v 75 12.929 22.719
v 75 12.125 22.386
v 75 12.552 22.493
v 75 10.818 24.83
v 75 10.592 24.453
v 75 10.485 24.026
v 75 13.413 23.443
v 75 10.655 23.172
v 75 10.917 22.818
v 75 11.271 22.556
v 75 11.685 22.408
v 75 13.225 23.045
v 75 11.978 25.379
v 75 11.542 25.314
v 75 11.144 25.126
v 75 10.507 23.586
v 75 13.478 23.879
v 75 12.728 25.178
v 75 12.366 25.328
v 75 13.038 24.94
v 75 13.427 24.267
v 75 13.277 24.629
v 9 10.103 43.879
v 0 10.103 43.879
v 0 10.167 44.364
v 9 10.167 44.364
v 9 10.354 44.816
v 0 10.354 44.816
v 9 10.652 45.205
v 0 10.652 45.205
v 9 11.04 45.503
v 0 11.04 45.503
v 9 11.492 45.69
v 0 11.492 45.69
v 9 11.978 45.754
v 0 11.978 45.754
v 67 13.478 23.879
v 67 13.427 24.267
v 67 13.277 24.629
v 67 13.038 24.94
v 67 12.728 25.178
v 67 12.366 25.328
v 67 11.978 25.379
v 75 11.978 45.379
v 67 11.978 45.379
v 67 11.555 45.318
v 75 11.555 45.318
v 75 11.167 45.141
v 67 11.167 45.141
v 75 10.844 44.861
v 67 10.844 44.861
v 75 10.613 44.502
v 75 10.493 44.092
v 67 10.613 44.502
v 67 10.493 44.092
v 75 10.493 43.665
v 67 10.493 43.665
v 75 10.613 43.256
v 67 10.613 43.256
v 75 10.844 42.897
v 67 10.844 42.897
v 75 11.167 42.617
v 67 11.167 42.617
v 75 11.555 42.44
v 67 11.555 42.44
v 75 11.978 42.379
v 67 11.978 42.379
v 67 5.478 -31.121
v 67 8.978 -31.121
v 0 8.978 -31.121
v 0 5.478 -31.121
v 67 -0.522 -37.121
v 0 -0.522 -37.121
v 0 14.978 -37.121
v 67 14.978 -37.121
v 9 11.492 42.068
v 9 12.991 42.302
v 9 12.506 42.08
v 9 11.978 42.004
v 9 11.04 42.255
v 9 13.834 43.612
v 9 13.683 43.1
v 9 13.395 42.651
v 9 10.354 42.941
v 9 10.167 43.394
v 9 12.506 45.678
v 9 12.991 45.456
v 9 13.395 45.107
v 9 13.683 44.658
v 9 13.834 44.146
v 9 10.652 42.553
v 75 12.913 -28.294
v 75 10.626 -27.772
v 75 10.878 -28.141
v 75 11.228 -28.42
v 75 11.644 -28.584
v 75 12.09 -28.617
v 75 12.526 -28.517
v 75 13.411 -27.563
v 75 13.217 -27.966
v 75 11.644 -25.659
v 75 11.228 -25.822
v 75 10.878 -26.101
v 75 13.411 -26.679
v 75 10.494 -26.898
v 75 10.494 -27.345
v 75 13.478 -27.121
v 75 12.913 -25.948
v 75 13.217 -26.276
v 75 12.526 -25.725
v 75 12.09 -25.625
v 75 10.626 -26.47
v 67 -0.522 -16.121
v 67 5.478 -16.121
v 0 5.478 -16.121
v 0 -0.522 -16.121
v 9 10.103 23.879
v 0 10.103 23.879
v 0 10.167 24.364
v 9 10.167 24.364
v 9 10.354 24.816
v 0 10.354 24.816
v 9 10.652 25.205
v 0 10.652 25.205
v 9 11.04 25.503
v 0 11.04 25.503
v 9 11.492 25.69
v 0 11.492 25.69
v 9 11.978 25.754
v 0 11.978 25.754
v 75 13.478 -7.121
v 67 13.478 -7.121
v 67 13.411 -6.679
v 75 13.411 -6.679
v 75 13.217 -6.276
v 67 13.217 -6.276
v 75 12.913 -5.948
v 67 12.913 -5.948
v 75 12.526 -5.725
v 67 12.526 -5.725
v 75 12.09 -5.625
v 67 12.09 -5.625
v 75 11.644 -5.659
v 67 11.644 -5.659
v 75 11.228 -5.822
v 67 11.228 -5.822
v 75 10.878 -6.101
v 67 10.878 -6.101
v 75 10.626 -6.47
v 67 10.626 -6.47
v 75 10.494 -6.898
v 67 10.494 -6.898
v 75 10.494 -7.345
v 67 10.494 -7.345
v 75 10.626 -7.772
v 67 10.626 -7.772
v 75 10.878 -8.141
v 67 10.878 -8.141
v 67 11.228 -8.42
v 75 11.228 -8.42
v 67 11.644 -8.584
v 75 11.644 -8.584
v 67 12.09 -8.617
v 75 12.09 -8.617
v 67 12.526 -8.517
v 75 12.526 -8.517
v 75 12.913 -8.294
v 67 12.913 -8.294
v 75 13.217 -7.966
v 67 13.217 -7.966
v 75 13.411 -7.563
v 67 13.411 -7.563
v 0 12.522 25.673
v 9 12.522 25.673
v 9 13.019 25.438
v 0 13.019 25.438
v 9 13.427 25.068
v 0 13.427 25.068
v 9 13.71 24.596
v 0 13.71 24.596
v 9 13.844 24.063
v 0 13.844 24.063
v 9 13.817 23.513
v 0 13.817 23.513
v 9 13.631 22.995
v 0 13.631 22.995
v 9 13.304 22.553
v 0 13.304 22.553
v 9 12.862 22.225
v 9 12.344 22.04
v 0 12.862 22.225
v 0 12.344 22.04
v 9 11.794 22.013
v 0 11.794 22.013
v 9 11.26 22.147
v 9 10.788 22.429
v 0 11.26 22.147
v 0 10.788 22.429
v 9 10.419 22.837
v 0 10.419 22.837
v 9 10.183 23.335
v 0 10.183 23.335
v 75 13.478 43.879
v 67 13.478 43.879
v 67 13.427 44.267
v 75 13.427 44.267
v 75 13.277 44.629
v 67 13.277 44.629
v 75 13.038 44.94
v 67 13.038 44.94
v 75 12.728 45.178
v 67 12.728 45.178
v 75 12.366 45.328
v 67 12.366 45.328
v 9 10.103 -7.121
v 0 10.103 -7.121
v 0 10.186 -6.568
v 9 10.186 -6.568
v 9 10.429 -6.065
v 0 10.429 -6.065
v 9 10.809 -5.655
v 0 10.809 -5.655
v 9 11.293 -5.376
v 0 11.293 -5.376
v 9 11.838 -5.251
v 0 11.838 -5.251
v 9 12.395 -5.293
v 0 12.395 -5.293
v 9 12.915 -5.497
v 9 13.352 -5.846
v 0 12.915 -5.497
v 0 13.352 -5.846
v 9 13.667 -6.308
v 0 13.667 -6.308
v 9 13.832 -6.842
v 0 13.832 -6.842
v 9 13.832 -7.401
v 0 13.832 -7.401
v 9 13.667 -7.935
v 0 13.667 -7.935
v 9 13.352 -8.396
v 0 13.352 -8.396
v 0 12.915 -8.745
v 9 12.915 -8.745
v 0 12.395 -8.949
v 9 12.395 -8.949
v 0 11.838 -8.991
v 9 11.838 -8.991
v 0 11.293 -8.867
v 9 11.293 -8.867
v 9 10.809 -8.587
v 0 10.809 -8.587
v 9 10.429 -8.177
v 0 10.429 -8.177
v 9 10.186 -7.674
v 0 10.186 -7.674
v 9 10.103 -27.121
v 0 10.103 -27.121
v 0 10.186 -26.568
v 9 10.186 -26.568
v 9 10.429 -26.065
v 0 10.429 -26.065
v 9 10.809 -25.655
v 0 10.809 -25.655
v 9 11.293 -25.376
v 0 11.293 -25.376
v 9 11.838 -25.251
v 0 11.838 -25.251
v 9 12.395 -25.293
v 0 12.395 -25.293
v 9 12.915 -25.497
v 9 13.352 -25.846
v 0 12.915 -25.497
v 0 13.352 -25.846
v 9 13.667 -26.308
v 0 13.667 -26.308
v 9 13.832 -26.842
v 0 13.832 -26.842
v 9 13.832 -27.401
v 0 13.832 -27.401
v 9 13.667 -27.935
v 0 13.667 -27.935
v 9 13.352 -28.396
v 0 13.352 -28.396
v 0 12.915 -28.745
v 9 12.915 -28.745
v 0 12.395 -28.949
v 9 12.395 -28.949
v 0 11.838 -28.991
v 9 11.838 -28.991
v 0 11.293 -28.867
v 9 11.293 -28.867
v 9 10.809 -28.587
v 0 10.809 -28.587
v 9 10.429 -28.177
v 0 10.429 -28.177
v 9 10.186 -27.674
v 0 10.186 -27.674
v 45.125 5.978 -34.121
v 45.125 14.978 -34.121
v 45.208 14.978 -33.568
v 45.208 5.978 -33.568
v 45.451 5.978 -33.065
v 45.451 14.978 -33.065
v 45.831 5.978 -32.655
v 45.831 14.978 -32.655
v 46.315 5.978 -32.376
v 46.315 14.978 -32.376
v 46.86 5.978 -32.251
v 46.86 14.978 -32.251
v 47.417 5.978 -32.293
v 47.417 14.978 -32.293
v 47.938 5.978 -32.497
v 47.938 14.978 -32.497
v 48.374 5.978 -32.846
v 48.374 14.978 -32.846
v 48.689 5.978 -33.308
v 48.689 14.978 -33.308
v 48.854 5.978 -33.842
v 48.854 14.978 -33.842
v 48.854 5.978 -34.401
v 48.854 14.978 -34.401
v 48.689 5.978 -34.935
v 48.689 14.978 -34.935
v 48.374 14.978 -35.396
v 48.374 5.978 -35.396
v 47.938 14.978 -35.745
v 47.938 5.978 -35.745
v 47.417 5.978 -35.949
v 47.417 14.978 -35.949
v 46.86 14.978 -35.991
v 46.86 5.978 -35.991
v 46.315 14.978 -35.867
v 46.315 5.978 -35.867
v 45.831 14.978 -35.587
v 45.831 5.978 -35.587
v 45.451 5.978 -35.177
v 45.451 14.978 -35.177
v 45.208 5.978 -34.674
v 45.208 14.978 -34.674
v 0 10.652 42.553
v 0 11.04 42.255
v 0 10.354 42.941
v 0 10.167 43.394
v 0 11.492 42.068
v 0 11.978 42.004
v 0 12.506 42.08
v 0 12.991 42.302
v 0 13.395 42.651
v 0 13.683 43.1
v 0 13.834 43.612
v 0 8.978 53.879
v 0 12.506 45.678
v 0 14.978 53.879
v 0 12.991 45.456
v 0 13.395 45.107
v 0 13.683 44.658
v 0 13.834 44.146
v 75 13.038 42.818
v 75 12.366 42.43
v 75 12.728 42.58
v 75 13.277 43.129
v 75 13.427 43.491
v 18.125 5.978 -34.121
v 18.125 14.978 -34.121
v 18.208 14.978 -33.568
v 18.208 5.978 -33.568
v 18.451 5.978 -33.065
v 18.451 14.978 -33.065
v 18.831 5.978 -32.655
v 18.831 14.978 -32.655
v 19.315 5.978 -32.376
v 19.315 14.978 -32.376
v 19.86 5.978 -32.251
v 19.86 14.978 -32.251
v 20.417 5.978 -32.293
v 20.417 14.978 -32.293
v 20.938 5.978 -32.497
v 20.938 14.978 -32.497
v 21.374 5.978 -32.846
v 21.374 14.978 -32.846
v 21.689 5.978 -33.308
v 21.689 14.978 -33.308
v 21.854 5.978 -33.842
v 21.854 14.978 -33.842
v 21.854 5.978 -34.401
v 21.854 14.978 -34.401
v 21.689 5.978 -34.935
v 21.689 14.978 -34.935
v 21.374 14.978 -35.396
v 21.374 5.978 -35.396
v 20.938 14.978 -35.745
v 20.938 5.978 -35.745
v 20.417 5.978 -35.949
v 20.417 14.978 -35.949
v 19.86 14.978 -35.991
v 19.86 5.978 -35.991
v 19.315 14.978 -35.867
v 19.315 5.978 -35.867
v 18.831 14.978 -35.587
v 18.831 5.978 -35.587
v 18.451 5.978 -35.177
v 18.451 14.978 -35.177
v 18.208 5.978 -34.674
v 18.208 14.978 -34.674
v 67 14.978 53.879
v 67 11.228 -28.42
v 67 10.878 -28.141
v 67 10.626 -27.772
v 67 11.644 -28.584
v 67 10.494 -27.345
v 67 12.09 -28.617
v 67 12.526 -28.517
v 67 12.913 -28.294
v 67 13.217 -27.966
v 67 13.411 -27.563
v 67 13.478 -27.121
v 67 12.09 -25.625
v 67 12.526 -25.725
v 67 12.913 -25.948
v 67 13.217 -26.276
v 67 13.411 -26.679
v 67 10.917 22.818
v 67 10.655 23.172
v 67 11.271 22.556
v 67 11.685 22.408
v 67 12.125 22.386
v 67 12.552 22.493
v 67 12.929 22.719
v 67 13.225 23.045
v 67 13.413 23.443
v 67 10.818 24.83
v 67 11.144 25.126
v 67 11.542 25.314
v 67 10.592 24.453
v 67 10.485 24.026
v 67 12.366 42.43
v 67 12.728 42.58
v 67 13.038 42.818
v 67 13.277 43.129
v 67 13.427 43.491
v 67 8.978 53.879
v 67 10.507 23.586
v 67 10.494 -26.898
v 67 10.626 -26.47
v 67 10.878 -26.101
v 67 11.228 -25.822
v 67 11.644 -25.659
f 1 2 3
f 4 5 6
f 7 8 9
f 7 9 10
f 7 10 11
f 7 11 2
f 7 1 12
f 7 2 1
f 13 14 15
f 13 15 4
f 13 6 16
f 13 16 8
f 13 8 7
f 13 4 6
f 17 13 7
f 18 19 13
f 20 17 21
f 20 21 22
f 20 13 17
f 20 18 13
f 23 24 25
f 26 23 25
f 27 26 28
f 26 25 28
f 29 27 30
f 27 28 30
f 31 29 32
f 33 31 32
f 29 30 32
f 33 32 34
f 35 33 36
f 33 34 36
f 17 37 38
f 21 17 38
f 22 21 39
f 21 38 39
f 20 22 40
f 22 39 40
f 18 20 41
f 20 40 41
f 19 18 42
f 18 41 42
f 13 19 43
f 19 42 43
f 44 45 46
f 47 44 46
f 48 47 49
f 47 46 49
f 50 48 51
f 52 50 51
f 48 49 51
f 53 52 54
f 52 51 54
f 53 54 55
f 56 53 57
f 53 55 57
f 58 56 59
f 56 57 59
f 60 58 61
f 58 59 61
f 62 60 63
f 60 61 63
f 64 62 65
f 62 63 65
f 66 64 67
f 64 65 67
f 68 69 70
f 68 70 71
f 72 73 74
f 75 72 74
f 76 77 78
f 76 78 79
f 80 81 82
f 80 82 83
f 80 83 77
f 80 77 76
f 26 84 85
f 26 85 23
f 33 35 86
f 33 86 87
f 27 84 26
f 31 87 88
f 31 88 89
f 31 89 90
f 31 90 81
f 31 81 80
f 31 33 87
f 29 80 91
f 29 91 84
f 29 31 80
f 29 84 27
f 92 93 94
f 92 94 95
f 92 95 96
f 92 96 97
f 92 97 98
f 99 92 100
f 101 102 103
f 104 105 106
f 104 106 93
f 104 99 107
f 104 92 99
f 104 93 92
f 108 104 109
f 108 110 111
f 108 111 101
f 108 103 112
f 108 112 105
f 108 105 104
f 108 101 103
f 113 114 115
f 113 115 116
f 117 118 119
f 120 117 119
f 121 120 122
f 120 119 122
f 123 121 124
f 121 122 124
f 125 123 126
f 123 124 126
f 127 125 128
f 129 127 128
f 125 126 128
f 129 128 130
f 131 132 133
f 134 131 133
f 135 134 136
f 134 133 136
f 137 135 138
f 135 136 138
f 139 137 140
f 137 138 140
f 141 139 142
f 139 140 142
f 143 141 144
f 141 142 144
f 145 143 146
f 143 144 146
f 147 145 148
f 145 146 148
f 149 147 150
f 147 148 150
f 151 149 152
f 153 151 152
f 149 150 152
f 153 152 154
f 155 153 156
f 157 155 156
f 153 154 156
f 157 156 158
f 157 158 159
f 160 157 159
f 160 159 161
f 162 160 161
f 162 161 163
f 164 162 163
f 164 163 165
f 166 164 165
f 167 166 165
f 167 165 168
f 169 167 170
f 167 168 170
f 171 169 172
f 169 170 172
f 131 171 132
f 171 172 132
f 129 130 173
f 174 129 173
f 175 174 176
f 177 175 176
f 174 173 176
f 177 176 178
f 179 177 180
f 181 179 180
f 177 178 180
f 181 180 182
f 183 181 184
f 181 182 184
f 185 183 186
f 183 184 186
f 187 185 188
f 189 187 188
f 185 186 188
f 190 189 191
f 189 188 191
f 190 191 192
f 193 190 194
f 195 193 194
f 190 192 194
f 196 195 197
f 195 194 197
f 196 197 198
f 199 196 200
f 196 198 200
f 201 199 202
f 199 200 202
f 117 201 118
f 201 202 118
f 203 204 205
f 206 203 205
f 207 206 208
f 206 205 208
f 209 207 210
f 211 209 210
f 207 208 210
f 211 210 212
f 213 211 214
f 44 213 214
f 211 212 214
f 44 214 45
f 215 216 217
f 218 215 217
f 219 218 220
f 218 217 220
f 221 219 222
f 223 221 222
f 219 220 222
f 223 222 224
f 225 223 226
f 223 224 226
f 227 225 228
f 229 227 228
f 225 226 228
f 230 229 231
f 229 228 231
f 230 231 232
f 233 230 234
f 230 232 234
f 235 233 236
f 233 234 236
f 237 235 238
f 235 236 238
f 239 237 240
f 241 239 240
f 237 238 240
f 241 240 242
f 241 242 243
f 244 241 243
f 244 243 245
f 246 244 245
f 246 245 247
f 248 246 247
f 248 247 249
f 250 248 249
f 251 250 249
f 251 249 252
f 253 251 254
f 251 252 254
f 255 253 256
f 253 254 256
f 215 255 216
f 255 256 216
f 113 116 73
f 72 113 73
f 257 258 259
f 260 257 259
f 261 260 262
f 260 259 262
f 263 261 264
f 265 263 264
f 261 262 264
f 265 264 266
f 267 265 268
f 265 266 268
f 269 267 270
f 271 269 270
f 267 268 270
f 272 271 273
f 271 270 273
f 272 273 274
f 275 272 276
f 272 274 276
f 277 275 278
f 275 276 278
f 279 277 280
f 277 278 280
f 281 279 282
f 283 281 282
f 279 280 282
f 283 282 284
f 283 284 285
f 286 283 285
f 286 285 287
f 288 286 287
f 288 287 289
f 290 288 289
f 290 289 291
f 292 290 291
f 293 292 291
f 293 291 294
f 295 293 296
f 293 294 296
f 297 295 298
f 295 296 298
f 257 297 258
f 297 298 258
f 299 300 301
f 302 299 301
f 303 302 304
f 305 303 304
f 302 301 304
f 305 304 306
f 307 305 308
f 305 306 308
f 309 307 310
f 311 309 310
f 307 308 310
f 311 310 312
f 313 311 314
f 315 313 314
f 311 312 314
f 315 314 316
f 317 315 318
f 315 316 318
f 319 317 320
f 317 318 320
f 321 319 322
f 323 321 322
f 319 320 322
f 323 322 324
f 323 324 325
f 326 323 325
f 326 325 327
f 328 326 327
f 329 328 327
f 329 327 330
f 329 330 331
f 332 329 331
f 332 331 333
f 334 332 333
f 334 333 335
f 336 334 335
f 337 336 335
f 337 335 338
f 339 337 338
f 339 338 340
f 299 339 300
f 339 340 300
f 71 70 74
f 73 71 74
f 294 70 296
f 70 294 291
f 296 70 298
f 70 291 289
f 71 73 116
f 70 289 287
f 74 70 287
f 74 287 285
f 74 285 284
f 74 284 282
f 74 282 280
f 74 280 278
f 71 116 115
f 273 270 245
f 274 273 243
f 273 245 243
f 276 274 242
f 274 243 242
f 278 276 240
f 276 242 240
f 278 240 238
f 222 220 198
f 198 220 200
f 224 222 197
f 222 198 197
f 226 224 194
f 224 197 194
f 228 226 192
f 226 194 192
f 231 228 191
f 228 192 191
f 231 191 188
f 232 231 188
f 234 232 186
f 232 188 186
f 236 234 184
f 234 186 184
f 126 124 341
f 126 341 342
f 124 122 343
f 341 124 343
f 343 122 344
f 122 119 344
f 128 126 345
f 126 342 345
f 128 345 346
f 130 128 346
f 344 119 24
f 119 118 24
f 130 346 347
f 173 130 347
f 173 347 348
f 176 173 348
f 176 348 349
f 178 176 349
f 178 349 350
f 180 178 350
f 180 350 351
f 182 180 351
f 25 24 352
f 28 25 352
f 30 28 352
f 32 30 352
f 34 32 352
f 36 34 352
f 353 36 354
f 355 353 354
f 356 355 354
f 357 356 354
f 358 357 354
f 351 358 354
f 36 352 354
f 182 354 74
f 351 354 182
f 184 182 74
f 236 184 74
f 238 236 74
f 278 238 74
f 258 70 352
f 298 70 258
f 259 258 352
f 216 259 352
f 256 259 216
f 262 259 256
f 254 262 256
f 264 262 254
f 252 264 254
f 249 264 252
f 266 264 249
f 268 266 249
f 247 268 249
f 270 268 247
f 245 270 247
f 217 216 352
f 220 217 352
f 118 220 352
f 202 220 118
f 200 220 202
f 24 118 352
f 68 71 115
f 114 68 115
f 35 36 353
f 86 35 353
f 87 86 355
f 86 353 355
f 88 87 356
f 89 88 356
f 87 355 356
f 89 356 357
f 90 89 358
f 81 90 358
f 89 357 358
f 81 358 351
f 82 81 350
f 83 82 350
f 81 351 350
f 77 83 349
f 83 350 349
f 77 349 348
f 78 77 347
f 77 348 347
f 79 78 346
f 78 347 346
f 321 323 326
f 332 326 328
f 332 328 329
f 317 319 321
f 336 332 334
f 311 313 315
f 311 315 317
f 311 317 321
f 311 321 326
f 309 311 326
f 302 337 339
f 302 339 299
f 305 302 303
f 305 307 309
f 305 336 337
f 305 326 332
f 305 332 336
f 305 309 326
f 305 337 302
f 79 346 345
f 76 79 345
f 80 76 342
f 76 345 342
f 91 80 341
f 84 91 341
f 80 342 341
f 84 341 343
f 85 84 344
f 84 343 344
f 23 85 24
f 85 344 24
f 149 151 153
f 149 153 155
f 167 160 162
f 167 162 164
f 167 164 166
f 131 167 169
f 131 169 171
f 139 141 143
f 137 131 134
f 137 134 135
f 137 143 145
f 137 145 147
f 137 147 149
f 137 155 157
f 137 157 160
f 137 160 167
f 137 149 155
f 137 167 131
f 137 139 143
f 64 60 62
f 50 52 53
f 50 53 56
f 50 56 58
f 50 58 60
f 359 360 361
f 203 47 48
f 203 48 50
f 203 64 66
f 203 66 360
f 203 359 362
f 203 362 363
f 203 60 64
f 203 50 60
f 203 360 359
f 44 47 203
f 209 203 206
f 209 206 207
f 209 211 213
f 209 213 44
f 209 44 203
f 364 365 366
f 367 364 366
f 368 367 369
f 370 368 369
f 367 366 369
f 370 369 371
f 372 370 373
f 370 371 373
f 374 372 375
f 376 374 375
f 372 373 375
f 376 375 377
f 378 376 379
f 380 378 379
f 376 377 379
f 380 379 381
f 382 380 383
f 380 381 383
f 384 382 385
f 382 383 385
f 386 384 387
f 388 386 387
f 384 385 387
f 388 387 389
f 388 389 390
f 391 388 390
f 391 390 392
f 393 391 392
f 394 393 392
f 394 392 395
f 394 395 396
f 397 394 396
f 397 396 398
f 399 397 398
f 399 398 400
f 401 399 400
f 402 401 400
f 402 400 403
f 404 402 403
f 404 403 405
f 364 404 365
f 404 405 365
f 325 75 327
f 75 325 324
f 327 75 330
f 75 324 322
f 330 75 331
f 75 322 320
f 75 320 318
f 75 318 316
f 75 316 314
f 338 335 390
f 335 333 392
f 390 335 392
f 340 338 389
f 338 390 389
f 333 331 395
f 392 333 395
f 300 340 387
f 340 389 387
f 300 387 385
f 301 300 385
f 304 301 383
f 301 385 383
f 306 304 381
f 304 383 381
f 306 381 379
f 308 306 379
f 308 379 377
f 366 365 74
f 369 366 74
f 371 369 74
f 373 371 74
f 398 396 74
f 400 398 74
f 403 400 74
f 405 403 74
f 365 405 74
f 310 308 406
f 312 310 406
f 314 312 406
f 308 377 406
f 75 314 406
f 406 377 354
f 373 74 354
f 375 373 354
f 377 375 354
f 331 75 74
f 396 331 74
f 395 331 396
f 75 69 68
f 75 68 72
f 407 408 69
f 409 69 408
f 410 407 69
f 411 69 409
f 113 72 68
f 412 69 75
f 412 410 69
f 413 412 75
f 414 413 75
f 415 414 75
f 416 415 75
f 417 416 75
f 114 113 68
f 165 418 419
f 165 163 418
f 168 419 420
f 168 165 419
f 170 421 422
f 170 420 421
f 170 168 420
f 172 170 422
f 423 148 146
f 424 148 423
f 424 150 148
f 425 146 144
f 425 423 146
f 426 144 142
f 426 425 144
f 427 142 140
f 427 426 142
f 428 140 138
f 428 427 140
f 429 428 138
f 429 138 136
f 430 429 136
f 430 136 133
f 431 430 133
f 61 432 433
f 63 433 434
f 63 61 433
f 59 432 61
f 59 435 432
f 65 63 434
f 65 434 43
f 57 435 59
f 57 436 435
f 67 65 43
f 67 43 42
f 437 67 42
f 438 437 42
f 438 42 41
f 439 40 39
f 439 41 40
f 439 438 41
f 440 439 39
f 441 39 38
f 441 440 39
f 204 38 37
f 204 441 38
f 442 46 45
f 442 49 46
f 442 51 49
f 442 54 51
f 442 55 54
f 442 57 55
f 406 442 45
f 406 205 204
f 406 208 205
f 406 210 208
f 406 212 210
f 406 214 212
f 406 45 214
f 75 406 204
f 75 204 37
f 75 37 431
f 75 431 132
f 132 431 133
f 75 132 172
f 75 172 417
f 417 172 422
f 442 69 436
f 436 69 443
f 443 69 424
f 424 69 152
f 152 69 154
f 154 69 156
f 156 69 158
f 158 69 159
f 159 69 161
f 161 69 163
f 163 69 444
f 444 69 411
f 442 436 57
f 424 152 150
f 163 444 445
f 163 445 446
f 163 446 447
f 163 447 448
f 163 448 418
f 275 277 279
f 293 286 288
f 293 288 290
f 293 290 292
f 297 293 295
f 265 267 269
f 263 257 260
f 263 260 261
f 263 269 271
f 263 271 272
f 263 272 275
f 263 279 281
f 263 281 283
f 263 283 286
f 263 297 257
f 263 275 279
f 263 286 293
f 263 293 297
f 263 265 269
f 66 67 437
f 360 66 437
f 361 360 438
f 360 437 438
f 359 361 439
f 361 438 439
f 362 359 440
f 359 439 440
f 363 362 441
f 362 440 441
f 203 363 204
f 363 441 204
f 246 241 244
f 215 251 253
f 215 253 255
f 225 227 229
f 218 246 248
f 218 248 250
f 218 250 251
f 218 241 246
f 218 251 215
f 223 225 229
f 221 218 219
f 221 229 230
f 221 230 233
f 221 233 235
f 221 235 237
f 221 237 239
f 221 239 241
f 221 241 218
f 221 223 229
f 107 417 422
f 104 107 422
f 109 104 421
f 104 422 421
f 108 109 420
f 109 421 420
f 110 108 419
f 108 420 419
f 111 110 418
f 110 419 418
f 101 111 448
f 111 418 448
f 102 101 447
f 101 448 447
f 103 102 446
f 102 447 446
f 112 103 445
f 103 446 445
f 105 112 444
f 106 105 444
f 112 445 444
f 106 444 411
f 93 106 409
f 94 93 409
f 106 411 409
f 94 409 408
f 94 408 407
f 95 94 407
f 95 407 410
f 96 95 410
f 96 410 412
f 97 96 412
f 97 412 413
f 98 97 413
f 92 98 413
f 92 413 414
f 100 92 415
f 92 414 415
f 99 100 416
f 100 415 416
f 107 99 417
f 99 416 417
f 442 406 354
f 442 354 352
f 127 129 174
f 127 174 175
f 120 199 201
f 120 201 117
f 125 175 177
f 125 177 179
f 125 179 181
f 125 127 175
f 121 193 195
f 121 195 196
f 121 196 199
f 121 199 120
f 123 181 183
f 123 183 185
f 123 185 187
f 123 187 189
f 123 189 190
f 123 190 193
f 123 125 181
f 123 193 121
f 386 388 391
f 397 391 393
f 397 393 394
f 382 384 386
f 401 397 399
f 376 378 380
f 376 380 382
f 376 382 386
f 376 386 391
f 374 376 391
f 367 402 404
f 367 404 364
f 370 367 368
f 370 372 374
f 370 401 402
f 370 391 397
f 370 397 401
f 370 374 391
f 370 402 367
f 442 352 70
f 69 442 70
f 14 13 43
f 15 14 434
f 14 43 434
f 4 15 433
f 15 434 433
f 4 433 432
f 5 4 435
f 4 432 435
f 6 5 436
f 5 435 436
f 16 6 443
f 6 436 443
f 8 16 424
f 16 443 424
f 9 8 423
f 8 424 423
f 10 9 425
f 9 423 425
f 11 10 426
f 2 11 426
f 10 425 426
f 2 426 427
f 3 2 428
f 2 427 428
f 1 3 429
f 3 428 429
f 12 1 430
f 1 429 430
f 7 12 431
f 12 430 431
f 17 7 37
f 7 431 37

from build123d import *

# Parameters (mm, degrees)
F1_DEPTH = 67
F2_R     = 1.5
F3_DEPTH = 8
F4_R     = 1.875
F5_DEPTH = 9
F6_R     = 1.875
F7_DEPTH = 9
F8_R     = 1.875
F9_DEPTH = 9


# Not quite as in the source:
# - a feature names something its author has since deleted; it is built from what else it names


with BuildPart() as f1:
    # F0 (on Right) → F1 (new body)
    with BuildSketch(Plane.YZ):
        Polygon((14.9777059274, -37.1211464703), (14.9777059274, 53.8788535297), (8.9777059274, 53.8788535297), (8.9777059274, -31.1211464703), (5.4777059274, -31.1211464703), (5.4777059274, -16.1211464703), (-0.5222940726, -16.1211464703), (-0.5222940726, -37.1211464703), align=None)
    extrude(amount=F1_DEPTH)

    # F2 (on face) → F3 (join)
    with BuildSketch(Plane.YZ.offset(67)):
        with BuildLine():
            Line((11.9777059274, 43.8788535297), (11.9777059274, 45.3788535297))
            ThreePointArc((11.9777059274, 45.3788535297), (10.4777059274, 43.8788535297), (11.9777059274, 42.3788535297))
            Line((11.9777059274, 42.3788535297), (11.9777059274, 43.8788535297))
        make_face()
        with BuildLine():
            ThreePointArc((11.9777059274, 42.3788535297), (13.0383660992, 42.8181933579), (13.4777059274, 43.8788535297))
            ThreePointArc((13.4777059274, 43.8788535297), (13.0383660992, 44.9395137015), (11.9777059274, 45.3788535297))
            Line((11.9777059274, 45.3788535297), (11.9777059274, 43.8788535297))
            Line((11.9777059274, 43.8788535297), (11.9777059274, 42.3788535297))
        make_face()
        with BuildLine():
            ThreePointArc((13.4777059274, 23.8788535297), (13.0383660992, 24.9395137015), (11.9777059274, 25.3788535297))
            ThreePointArc((11.9777059274, 25.3788535297), (10.9170457557, 22.8181933579), (13.4777059274, 23.8788535297))
        make_face()
        with Locations((11.9777059274, -7.1211464703)):
            Circle(F2_R)
        with Locations((11.9777059274, -27.1211464703)):
            Circle(F2_R)
    extrude(amount=F3_DEPTH)

    # F4 (on face) → F5 (cut)
    with BuildSketch(Plane(origin=(0, 0, 0), x_dir=(0, -1, 0), z_dir=(-1, 0, 0))):
        with Locations((-18.4777059274, 23.8788535297)):
            Circle(F4_R)
        with Locations((-18.4777059274, 43.8788535297)):
            Circle(F4_R)
        with Locations((-18.4777059274, -7.1211464703)):
            Circle(F4_R)
        with Locations((-18.4777059274, -27.1211464703)):
            Circle(F4_R)
    extrude(amount=-F5_DEPTH, mode=Mode.SUBTRACT)

    # F6 (on face) → F7 (cut)
    with BuildSketch(Plane(origin=(0, 14.9777059274, 0), x_dir=(-1, 0, 0), z_dir=(0, 1, 0))):
        with Locations((-47, -34.1211464703)):
            Circle(F6_R)
        with Locations((-20, -34.1211464703)):
            Circle(F6_R)
    extrude(amount=-F7_DEPTH, mode=Mode.SUBTRACT)

    # F8 (on face) → F9 (cut)
    with BuildSketch(Plane(origin=(0, 0, 0), x_dir=(0, -1, 0), z_dir=(-1, 0, 0))):
        with BuildLine():
            ThreePointArc((-10.1027059274, 43.8788535297), (-10.6518807127, 45.2046787444), (-11.9777059274, 45.7538535297))
            Line((-11.9777059274, 45.7538535297), (-11.9777059274, 43.8788535297))
            Line((-11.9777059274, 43.8788535297), (-11.9777059274, 42.0038535297))
            ThreePointArc((-11.9777059274, 42.0038535297), (-10.6518807127, 42.553028315), (-10.1027059274, 43.8788535297))
        make_face()
        with BuildLine():
            ThreePointArc((-10.1027059274, 23.8788535297), (-10.6518807127, 25.2046787444), (-11.9777059274, 25.7538535297))
            ThreePointArc((-11.9777059274, 25.7538535297), (-13.3035311422, 22.553028315), (-10.1027059274, 23.8788535297))
        make_face()
        with BuildLine():
            Line((-11.9777059274, 43.8788535297), (-11.9777059274, 45.7538535297))
            ThreePointArc((-11.9777059274, 45.7538535297), (-13.8527059274, 43.8788535297), (-11.9777059274, 42.0038535297))
            Line((-11.9777059274, 42.0038535297), (-11.9777059274, 43.8788535297))
        make_face()
        with Locations((-11.9777059274, -27.1211464703)):
            Circle(F8_R)
        with Locations((-11.9777059274, -7.1211464703)):
            Circle(F8_R)
    extrude(amount=-F9_DEPTH, mode=Mode.SUBTRACT)


solid = f1.part
